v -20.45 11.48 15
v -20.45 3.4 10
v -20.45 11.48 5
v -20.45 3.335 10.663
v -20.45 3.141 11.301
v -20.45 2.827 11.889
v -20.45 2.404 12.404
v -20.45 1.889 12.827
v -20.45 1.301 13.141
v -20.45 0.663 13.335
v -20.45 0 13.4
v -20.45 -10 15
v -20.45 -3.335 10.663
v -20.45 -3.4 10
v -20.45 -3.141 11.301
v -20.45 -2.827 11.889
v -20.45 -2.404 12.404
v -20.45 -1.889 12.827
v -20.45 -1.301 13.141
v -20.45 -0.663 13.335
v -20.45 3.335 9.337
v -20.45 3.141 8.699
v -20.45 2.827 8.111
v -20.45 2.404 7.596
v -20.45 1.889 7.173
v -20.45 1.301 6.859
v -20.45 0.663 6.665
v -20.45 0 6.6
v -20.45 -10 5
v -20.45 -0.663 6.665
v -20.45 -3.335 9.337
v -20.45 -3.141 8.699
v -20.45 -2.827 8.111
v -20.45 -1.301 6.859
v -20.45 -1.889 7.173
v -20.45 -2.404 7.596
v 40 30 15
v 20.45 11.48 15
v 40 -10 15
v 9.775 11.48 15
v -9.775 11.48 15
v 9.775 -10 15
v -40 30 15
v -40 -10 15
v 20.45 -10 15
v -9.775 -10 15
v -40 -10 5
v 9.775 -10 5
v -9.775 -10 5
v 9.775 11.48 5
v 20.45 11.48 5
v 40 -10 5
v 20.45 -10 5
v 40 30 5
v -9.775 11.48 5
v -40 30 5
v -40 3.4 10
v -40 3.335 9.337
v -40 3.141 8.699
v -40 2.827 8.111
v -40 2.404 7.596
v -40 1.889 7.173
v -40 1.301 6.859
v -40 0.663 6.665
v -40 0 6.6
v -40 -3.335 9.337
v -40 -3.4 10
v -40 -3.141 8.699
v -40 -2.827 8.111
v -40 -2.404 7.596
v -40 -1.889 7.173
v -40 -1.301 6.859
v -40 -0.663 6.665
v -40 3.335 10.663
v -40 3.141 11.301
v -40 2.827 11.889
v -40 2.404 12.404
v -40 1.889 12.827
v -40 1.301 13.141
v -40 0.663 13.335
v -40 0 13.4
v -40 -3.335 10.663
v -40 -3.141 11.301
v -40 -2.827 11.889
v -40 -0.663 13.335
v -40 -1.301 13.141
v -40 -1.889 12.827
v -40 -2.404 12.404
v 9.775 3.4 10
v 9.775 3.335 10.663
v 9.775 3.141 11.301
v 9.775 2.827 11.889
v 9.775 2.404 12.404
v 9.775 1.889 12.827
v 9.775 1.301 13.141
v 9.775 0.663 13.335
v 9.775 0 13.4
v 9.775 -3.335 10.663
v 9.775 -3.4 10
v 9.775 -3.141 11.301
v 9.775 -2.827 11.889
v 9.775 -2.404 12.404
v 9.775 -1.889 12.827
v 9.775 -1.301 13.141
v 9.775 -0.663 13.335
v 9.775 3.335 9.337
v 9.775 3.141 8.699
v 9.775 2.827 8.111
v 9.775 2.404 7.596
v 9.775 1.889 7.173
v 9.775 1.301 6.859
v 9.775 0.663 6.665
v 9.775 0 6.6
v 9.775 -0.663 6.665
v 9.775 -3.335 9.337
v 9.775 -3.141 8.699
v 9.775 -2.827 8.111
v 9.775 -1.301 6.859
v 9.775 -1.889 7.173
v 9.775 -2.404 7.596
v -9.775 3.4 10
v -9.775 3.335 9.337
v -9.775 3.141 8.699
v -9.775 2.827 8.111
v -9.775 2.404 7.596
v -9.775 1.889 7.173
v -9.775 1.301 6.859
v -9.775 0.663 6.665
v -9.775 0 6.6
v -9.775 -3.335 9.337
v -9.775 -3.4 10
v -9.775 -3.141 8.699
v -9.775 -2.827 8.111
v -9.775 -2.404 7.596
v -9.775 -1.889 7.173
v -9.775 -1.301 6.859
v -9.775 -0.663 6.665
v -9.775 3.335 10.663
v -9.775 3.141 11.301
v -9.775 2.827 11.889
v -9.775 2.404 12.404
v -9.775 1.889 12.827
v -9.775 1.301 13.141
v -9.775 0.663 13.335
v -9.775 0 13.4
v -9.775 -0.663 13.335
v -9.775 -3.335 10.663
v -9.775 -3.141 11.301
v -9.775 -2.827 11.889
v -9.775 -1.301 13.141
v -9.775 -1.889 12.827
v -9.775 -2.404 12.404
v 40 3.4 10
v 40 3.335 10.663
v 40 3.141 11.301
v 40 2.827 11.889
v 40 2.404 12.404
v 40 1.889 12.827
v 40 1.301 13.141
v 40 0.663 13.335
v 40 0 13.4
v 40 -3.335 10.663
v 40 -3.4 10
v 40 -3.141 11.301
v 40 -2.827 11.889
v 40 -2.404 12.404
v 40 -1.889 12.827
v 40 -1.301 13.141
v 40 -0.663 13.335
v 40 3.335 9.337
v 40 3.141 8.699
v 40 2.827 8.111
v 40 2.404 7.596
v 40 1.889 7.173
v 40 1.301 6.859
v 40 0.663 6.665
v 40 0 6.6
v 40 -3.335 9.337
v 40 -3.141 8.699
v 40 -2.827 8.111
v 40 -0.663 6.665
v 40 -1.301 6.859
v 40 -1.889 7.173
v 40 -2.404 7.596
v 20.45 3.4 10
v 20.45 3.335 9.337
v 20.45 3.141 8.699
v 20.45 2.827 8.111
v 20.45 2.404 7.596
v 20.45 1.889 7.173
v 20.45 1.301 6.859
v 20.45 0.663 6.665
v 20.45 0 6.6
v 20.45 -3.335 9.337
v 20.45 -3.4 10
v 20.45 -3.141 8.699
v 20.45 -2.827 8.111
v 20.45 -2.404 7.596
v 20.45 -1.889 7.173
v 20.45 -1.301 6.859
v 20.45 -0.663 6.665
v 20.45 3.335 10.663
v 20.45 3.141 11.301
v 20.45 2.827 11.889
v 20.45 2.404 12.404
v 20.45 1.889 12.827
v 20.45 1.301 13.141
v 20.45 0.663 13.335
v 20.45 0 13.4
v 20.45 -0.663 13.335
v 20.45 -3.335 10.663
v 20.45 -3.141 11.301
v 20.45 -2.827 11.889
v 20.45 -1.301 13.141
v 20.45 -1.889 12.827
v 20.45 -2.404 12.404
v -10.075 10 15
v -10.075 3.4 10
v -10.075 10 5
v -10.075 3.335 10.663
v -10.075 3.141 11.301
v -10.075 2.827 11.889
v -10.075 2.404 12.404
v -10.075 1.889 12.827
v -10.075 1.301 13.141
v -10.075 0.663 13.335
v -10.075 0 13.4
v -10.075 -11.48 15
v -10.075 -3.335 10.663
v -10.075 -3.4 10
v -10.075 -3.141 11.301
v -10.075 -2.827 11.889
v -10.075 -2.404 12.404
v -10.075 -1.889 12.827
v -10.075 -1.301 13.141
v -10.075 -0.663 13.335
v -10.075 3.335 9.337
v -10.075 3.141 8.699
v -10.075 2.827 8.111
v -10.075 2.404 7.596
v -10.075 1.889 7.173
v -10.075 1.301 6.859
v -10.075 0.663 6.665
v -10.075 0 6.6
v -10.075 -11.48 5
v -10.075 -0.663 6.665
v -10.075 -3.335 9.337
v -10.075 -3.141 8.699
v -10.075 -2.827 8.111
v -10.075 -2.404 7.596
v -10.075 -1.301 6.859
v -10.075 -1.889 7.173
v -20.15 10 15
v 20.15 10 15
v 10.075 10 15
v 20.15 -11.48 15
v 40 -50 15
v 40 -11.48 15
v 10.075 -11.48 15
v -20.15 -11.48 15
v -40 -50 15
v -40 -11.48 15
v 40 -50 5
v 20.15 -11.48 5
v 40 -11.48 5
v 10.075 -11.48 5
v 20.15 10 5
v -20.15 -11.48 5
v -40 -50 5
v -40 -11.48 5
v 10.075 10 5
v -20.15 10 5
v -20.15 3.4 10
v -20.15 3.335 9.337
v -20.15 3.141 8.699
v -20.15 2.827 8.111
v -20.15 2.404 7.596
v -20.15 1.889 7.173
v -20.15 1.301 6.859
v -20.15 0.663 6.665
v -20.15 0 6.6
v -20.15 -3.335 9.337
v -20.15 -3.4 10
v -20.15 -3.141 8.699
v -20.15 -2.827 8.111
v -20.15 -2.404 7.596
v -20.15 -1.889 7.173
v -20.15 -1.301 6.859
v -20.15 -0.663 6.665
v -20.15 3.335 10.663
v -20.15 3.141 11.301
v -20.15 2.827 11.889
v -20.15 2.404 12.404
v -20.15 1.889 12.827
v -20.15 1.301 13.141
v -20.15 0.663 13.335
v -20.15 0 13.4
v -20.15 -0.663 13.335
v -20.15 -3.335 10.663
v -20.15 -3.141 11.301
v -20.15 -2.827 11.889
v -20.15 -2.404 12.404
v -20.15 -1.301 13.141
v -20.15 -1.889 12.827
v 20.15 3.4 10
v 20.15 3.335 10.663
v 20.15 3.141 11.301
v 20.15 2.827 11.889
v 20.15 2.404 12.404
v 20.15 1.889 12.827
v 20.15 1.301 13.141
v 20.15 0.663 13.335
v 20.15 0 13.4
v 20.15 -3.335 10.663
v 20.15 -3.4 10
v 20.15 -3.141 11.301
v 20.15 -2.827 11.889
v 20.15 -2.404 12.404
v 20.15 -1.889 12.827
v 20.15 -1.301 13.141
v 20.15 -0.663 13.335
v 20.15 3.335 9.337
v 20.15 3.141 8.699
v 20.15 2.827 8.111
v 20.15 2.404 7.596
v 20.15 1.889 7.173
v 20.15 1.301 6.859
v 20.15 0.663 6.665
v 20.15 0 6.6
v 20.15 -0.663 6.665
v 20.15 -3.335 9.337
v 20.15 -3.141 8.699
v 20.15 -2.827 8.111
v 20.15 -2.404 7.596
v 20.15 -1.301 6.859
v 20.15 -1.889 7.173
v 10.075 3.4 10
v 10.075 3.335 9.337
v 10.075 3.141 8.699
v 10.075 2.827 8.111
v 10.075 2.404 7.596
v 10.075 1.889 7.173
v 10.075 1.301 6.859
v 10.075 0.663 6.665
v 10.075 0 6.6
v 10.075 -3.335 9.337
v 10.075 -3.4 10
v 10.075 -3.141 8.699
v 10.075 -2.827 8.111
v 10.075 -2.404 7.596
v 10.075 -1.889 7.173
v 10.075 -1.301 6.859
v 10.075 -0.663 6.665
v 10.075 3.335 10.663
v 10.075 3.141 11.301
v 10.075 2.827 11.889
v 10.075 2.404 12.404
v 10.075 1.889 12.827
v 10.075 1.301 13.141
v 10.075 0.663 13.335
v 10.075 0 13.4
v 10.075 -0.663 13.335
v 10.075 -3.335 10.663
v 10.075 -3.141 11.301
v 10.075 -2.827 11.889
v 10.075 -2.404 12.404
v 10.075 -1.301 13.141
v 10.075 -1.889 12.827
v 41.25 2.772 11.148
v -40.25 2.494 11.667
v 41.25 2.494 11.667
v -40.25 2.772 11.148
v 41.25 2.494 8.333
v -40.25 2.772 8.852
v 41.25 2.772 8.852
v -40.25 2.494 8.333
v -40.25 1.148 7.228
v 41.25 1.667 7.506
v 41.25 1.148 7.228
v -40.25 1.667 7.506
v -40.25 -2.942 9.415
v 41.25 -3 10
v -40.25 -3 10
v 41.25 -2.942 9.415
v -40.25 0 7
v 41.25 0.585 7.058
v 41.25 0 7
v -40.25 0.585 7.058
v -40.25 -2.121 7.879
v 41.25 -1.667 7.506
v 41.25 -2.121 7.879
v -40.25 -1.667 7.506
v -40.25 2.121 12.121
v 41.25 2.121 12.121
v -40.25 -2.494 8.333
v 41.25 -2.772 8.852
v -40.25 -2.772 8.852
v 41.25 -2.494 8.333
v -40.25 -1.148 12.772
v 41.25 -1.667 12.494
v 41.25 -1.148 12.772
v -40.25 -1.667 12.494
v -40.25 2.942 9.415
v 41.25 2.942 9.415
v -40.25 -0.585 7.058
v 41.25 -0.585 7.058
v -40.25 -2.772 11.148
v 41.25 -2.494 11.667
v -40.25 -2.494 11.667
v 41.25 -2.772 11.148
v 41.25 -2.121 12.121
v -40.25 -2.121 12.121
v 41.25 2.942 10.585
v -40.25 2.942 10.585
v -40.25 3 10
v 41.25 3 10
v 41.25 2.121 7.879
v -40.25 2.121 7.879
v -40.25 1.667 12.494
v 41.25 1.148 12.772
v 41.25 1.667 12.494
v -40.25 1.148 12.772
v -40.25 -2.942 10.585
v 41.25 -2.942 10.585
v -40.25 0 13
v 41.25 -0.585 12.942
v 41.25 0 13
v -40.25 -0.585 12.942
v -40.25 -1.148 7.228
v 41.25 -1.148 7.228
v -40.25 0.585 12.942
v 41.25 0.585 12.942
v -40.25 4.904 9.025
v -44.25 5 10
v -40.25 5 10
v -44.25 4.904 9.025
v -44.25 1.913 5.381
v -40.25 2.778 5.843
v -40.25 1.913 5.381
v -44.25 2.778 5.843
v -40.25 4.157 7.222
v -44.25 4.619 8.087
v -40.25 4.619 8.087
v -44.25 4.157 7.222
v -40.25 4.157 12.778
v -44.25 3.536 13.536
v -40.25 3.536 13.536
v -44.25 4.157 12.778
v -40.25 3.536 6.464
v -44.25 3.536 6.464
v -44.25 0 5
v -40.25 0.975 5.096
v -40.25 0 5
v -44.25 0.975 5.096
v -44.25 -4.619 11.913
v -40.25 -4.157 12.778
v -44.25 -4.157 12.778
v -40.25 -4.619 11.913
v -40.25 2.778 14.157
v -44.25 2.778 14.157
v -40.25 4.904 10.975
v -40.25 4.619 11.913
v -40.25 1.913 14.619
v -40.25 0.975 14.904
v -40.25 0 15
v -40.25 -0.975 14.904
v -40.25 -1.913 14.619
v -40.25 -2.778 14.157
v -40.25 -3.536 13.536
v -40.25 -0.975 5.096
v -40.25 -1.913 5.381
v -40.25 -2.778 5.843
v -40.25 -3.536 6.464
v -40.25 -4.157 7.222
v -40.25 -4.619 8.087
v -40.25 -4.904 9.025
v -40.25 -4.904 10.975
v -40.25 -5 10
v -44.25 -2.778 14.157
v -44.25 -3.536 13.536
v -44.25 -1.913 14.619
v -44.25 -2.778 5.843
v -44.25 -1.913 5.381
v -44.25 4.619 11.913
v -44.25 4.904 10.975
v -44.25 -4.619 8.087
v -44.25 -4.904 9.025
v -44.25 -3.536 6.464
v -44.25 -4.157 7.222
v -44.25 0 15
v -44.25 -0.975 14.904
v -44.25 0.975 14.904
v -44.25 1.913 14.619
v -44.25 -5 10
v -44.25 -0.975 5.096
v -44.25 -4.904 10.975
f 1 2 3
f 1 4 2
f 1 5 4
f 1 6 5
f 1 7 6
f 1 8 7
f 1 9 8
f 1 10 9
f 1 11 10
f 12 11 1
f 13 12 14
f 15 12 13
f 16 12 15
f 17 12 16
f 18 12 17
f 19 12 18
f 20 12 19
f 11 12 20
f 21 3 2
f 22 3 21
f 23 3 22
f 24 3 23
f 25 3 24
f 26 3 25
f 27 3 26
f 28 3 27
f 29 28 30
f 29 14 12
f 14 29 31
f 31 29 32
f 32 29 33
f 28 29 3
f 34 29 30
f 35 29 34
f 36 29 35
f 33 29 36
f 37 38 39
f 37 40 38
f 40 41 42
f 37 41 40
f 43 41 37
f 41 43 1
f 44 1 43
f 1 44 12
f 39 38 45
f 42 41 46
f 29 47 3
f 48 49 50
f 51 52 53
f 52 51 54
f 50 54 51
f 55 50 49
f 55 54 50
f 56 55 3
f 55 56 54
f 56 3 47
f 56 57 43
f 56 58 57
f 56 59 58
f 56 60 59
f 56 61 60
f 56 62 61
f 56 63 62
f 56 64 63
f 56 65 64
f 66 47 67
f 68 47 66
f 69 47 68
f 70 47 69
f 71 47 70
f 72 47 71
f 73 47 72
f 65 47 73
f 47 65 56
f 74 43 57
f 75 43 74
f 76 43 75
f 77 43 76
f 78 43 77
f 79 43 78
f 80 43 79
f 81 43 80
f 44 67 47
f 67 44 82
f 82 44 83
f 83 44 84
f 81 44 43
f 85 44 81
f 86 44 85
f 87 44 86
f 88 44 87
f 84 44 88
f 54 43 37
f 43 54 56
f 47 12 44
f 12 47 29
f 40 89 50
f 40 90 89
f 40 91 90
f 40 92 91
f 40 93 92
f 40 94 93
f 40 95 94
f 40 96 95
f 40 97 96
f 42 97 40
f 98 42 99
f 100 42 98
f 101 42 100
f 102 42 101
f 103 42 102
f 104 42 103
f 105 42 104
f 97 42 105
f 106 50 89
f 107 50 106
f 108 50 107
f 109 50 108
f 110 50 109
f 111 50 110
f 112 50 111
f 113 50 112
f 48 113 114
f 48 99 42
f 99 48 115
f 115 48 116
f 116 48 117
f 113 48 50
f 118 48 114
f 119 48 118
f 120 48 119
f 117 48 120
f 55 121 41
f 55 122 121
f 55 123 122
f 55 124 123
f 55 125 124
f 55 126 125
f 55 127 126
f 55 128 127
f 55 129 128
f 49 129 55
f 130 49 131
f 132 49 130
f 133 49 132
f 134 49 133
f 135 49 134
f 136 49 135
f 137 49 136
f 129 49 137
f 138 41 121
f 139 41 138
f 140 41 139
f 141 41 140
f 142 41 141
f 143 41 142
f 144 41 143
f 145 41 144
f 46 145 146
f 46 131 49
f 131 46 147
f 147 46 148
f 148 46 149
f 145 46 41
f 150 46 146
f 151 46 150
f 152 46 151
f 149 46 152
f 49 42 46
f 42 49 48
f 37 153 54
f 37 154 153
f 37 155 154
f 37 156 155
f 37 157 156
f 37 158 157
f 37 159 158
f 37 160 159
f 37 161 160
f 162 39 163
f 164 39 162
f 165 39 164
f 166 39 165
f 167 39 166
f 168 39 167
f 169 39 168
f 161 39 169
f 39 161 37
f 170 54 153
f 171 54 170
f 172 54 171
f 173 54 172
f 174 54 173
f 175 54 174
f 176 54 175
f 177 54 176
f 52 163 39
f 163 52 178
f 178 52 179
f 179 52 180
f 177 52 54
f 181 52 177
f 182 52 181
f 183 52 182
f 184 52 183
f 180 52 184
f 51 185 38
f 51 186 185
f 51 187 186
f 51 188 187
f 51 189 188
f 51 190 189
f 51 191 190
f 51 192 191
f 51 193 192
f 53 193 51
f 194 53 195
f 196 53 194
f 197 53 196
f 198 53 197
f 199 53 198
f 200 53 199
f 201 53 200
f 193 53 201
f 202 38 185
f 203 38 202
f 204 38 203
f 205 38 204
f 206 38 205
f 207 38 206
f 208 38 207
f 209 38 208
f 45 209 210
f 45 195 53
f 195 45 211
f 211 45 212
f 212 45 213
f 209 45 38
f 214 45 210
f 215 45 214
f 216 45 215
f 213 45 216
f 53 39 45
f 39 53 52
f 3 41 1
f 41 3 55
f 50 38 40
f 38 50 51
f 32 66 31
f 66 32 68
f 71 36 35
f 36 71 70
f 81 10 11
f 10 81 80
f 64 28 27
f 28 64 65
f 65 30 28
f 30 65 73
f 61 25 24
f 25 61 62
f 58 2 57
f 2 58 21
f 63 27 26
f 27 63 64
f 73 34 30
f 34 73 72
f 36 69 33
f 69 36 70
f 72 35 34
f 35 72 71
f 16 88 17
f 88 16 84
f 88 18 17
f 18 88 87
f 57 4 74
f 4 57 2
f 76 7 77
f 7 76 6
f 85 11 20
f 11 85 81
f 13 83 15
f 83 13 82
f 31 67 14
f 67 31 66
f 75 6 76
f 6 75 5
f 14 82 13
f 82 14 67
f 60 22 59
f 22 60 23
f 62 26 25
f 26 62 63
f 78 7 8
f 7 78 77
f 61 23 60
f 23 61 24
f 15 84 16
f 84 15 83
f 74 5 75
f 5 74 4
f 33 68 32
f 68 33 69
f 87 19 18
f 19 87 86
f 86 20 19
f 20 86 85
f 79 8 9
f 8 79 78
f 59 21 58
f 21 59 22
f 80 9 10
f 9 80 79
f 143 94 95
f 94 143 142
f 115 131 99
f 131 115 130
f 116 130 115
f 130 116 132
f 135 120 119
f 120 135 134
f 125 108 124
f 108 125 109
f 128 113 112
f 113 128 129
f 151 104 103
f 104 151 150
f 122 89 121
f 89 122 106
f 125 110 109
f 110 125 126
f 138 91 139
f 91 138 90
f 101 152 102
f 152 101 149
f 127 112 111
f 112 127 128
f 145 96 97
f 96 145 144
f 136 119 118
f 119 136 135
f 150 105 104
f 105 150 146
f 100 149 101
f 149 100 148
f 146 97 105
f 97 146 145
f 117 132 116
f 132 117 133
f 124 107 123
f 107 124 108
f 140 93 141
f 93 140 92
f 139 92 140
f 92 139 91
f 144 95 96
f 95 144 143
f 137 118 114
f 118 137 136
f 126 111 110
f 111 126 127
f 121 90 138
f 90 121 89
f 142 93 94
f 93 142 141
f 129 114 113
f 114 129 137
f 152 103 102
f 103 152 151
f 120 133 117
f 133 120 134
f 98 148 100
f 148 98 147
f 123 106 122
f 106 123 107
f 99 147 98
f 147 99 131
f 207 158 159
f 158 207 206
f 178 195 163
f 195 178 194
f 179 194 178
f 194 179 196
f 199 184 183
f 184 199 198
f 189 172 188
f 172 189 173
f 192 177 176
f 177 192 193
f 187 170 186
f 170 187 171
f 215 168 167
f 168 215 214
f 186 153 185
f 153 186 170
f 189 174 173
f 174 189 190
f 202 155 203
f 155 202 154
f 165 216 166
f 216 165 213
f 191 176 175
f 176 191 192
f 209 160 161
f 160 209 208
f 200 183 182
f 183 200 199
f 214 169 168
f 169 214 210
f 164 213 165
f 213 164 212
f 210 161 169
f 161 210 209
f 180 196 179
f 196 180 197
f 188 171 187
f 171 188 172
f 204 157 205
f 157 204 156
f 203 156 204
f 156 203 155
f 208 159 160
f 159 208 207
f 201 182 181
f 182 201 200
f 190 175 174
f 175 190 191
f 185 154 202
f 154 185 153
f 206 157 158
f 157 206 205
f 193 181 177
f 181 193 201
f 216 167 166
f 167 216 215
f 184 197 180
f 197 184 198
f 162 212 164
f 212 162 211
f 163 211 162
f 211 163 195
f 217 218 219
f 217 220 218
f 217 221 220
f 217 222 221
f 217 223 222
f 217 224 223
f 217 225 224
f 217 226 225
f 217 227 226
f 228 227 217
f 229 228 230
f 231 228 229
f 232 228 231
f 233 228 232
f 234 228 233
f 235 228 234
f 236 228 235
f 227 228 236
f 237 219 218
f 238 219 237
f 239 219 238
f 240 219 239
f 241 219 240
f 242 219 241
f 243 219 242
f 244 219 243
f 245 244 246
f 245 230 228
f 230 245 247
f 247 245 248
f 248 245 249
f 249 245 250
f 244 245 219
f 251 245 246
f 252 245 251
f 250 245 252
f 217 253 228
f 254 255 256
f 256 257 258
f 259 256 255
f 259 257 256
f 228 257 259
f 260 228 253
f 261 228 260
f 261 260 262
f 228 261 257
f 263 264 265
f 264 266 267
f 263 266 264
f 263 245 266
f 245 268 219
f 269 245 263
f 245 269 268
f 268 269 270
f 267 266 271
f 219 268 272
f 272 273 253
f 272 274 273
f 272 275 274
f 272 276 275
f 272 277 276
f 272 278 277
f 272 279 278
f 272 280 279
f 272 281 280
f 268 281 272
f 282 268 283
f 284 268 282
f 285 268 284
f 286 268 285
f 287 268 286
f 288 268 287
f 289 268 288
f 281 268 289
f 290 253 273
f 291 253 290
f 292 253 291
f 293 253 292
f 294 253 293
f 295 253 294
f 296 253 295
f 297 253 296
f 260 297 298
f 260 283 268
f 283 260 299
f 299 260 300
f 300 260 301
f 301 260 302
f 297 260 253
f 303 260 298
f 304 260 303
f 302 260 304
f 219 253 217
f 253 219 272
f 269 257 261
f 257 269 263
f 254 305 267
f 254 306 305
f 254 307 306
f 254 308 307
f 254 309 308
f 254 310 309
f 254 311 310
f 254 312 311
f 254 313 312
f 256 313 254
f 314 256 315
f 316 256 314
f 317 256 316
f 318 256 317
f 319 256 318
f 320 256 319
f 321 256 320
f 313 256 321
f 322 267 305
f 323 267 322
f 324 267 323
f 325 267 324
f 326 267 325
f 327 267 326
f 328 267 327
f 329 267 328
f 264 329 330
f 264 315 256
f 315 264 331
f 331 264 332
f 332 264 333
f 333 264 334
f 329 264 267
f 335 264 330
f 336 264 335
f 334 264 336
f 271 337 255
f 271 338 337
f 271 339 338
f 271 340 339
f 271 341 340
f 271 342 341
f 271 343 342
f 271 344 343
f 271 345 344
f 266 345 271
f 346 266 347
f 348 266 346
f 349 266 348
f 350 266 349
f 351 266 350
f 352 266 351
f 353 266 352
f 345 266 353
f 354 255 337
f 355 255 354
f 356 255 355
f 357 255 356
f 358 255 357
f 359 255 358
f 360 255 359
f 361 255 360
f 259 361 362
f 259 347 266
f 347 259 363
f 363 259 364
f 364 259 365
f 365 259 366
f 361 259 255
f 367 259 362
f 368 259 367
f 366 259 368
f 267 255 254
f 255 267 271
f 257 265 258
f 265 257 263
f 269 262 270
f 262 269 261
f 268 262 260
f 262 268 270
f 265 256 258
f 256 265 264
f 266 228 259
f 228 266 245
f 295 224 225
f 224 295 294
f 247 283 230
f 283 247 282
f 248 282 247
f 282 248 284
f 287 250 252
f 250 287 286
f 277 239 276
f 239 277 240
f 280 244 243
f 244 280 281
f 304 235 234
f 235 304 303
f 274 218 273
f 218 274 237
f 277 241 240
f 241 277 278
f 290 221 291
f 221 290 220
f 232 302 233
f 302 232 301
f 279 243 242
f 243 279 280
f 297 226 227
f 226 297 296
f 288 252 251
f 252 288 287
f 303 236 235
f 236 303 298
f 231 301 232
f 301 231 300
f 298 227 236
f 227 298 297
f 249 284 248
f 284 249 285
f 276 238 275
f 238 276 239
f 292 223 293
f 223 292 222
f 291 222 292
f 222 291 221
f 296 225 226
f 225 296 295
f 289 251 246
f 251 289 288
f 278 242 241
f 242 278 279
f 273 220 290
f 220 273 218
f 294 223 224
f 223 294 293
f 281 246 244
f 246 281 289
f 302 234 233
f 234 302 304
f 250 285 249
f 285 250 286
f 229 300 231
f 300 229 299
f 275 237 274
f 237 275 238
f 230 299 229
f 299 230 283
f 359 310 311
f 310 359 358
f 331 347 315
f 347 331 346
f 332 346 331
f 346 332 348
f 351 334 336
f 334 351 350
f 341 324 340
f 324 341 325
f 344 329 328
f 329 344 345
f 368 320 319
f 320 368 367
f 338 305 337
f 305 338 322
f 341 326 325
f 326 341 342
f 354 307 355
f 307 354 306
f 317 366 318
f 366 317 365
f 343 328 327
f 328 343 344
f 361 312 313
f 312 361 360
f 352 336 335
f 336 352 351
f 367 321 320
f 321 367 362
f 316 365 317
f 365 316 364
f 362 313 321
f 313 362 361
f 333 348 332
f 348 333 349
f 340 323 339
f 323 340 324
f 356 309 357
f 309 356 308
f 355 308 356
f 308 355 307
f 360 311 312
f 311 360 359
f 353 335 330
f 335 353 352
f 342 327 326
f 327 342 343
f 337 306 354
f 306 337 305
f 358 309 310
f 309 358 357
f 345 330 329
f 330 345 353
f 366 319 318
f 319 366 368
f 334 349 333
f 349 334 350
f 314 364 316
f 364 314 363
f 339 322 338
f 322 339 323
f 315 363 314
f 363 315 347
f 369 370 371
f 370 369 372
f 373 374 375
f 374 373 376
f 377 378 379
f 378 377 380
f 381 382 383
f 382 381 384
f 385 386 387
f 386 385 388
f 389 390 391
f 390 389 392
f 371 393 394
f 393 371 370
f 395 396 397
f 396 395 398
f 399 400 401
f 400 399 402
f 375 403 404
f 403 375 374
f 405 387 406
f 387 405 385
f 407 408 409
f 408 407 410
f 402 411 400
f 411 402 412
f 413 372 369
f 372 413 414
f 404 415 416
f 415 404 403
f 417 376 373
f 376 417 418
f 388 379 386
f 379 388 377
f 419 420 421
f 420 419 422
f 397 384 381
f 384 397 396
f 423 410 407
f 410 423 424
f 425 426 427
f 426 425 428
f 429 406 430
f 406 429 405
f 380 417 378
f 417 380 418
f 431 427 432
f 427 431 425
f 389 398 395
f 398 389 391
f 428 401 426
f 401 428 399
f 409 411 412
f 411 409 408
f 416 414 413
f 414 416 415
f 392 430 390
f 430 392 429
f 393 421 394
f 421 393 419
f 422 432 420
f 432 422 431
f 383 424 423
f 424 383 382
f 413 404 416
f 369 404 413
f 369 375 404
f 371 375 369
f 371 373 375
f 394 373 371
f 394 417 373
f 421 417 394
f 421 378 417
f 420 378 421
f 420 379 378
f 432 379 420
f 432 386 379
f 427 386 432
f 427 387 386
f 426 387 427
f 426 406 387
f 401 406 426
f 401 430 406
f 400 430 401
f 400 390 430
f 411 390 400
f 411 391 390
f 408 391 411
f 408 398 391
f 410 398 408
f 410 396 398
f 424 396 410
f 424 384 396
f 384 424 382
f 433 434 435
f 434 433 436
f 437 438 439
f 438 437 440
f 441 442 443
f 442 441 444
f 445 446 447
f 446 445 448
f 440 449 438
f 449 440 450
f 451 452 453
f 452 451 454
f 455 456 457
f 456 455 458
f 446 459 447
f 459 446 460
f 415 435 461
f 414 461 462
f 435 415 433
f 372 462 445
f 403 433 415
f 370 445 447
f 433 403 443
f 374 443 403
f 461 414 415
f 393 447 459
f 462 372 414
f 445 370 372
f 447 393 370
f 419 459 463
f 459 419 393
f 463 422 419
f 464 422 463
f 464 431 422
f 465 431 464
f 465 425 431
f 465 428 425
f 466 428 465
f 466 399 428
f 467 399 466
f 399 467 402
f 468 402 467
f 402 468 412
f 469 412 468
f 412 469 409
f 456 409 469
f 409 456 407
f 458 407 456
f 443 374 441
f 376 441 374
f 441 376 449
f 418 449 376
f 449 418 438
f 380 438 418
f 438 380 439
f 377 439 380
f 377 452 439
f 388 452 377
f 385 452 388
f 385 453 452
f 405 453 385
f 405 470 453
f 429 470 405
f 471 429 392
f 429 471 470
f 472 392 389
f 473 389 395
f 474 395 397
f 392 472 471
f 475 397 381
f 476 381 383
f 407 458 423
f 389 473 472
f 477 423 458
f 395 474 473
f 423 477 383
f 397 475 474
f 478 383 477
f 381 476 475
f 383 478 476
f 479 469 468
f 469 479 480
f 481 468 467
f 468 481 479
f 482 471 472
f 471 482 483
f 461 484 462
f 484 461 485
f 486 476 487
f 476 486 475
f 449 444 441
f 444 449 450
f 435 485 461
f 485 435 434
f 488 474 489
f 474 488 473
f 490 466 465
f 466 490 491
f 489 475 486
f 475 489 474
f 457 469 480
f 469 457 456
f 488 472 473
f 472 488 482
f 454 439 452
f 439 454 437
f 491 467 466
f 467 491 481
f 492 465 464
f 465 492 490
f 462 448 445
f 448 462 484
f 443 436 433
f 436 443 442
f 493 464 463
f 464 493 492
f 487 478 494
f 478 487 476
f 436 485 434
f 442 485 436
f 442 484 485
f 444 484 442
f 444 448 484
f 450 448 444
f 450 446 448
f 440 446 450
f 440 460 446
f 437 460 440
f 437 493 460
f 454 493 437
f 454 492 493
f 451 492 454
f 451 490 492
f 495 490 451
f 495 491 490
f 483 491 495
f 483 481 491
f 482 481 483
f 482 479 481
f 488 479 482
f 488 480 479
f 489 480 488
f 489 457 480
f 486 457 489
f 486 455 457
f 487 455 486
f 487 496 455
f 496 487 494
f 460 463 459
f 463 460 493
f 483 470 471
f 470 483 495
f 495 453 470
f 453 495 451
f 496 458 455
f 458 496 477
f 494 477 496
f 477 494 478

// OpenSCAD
$fn = 32;

// ------------------------------------------------------------------------
// Butt hinge: hinge 80 mm, leaf swung 0 deg
// Every part is its own module, assembly() places every instance.
// ------------------------------------------------------------------------

// --- part 1 ---
module hinge_base() {
  difference() {
    union() {
      translate([-40, -10, -5]) cube([19.55, 40, 10]);
      translate([-9.775, -10, -5]) cube([19.55, 40, 10]);
      translate([20.45, -10, -5]) cube([19.55, 40, 10]);
      translate([-40, 11.48, -5]) cube([80, 18.52, 10]);
    }
    translate([-30.225, 0, 0]) rotate([0, 90, 0]) cylinder(h = 21.55, d = 6.8, center = true);
    translate([0, 0, 0]) rotate([0, 90, 0]) cylinder(h = 21.55, d = 6.8, center = true);
    translate([30.225, 0, 0]) rotate([0, 90, 0]) cylinder(h = 21.55, d = 6.8, center = true);
  }
}

// --- part 2 ---
module hinge_mover() {
  difference() {
    union() {
      translate([-20.15, -50, -5]) cube([10.075, 60, 10]);
      translate([10.075, -50, -5]) cube([10.075, 60, 10]);
      translate([-40, -50, -5]) cube([80, 38.52, 10]);
    }
    translate([-15.113, 0, 0]) rotate([0, 90, 0]) cylinder(h = 12.075, d = 6.8, center = true);
    translate([15.113, 0, 0]) rotate([0, 90, 0]) cylinder(h = 12.075, d = 6.8, center = true);
  }
}

// --- part 3 ---
module hinge_pin() {
  rotate([0, 90, 0]) cylinder(h = 82.5, d = 6, center = true);
  translate([-44.25, 0, 0]) rotate([0, 90, 0]) cylinder(h = 4, d = 10);
}

// --- assembly ---
module assembly() {
  color([0.80, 0.24, 0.20]) translate([0, 0, 10]) rotate([0, 0, 0]) hinge_base();
  color([0.20, 0.45, 0.75]) translate([0, 0, 10]) rotate([0, 0, 0]) hinge_mover();
  color([0.25, 0.62, 0.32]) translate([0, 0, 10]) rotate([0, 0, 0]) hinge_pin();
}

assembly();
